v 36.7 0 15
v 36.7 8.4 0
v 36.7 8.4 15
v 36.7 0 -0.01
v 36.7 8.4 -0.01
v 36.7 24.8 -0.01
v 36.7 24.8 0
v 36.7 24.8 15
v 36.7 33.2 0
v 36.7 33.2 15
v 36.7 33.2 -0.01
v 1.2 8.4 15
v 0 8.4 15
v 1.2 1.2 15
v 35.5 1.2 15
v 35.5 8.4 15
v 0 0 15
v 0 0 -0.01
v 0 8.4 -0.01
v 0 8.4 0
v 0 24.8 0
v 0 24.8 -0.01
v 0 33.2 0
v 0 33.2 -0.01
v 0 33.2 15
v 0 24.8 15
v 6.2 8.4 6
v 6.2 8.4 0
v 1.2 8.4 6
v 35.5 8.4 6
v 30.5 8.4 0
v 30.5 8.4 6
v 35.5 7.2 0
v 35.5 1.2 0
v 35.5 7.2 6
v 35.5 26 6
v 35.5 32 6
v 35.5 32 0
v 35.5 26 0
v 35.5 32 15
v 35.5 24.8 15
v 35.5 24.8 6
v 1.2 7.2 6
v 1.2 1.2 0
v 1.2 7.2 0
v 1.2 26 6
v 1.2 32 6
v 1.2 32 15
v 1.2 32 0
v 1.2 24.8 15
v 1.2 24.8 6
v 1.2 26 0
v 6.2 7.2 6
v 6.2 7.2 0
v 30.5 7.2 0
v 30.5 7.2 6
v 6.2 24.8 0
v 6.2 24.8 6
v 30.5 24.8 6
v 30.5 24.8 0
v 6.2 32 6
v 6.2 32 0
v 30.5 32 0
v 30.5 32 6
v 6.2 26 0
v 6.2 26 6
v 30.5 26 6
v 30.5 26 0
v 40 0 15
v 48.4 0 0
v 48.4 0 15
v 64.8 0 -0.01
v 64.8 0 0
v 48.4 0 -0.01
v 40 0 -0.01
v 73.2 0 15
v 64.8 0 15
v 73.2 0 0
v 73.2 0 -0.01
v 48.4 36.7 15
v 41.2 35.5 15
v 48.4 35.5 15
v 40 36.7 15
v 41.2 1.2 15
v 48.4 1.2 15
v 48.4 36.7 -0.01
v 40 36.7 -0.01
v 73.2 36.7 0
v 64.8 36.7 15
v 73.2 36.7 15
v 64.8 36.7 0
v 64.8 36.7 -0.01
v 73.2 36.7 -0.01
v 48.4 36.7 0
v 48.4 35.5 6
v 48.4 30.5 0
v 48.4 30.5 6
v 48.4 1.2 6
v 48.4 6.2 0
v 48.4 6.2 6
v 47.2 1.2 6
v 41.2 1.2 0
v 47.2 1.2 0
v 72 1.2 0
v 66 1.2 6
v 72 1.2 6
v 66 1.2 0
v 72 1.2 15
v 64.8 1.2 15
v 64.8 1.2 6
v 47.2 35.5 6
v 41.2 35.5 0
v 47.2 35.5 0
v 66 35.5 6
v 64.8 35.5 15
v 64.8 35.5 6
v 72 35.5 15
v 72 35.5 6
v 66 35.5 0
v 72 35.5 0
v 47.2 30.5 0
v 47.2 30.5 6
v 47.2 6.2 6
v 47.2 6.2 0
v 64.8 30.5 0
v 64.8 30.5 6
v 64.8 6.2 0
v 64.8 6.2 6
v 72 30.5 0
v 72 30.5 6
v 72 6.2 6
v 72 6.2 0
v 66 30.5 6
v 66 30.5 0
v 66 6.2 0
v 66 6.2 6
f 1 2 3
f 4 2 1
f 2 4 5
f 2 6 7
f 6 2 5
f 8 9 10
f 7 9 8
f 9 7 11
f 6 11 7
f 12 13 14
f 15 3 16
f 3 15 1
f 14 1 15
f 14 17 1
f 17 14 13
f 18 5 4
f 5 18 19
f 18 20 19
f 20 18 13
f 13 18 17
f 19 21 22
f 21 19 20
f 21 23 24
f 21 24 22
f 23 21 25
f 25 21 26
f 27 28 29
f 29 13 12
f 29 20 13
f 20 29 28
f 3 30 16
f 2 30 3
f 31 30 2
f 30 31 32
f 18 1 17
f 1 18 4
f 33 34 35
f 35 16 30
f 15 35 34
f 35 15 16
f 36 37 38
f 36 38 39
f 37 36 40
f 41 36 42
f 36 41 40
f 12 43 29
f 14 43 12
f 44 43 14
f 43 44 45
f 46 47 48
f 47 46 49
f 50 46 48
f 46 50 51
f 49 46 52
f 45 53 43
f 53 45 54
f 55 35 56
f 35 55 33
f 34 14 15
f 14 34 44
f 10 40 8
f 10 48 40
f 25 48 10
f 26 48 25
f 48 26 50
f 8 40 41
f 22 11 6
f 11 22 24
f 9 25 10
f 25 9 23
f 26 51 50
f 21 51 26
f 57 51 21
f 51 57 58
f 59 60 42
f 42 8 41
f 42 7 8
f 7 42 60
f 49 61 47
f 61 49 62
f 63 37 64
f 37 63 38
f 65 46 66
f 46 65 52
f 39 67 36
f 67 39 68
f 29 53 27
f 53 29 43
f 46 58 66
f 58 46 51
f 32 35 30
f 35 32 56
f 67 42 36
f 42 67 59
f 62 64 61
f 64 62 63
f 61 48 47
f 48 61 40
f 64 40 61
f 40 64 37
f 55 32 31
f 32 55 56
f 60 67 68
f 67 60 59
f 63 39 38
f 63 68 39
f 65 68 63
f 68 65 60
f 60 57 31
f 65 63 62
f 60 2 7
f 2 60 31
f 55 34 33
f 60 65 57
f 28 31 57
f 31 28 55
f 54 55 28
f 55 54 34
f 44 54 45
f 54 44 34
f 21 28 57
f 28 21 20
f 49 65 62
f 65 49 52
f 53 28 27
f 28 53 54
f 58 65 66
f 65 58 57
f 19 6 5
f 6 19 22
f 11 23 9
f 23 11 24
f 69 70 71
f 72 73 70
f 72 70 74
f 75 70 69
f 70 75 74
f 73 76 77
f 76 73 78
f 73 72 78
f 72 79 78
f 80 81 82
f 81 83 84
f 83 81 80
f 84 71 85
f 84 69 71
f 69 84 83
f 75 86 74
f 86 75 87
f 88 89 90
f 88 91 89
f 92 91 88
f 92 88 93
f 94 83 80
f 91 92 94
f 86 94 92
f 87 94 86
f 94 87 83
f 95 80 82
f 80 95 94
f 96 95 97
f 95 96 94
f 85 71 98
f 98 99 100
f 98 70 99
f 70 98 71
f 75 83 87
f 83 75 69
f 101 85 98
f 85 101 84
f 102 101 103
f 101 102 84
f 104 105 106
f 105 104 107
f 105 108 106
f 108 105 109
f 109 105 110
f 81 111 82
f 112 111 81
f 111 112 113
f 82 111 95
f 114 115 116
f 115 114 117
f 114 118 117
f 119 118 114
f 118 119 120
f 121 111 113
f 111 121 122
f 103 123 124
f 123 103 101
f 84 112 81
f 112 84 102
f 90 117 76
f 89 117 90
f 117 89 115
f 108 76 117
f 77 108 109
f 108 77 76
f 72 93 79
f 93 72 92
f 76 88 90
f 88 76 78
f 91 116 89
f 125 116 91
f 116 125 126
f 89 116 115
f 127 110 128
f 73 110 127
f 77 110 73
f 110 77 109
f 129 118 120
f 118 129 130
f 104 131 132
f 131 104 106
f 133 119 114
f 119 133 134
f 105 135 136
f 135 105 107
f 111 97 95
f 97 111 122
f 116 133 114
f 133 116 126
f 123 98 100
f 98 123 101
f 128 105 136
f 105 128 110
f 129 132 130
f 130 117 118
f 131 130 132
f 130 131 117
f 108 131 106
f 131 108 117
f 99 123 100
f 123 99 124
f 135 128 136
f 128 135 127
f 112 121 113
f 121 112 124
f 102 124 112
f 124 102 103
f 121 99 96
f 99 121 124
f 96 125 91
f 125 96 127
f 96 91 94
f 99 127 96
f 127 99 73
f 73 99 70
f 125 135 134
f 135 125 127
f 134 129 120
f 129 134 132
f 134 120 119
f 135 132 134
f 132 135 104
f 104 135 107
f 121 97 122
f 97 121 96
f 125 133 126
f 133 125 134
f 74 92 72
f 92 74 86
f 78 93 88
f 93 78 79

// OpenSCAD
// file: ../../Base/Boxes.scad
// Fischertechnik Box Foundation
// Pre-designed Boxes

use <Constants.scad>

include <PlacementOptions.scad>

box190Width = 190;
box190Depth = 130;
box130Width = 130;
box130Depth = 95;
boxUsageHeight = 33.9;
boxWallThickness = 2.4;
boxBaseThickness = 1.0;

// getBoxWallThickness()
// Gets the wall thickness of a Fischertechnik Box

function getBoxWallThickness() = boxWallThickness;

// Gets the usable height of a fischertechnik box
function getBoxUsageHeight() = boxUsageHeight;

// Gets the thickness of the Fischertechnik box base.
function getBoxBaseThickness() = boxBaseThickness;

// Gets the usable inner space of a Box 190 as an x/y-list
function getBox190Space() = [
    box190Width - 2*getBoxWallThickness(), 
    box190Depth - 2*getBoxWallThickness() ];

// Imports the Fischertechnik empty box 130x190 mm and places it at position 0,0
// 190x130 are the outer sizes, the inner space is slightly smaller. Use getBox190Space() to get the inner sizes.
// This module needs the STL file "Fischertechnik Box 130x190.stl" in the library path.
// The box is positioned that the usable inner space is at the 0,0,0 position. The

module Box190() {
    translate([-getBoxWallThickness(),-getBoxWallThickness(),-getBoxBaseThickness()])
        import("Fischertechnik Box 130x190.stl", convexity=3);
}

// Gets the usable inner space of a Box 130 as an x/y-list
function getBox130Space() = [
    box130Width - 2*getBoxWallThickness(), 
    box130Depth - 2*getBoxWallThickness() ];

// Imports the Fischertechnik empty box 95x130 mm and places it at position 0,0
// 190x130 are the outer sizes, the inner space is slightly smaller. Use getBox190Space() to get the inner sizes.
// This module needs the STL file "Fischertechnik Box 95x130.stl" in the library path.
// The box is positioned that the usable inner space is at the 0,0,0 position. The

module Box130() {
    translate([-getBoxWallThickness(),-getBoxWallThickness(),-getBoxBaseThickness()])
        import("Fischertechnik Box 95x130.stl", convexity=3);
}

// Creates a web at the specified box walls
// corner 0 = LowerLeft, 1 = UpperLeft, 2 = UpperRight, 3 = LowerRight
// side 0 = LeftOfCorner, 1 = RightOfCorner
// distance = Distance in mm from the corner
// box = inner width and depth of the box (default: Box 190)
// webWidth = length of the web (default is 3 mms)
// webThickness = thickness of the web (default is 1 mm)

module BoxWeb(corner, side, distance, box=getBox190Space(), webWidth=3, webThickness=1.0) {
    sink = getBoxWallThickness()/2;

    width = (corner % 2 == 0) ? 
            (side == LeftOfCorner ? webWidth : webThickness) :
            (side == LeftOfCorner ? webThickness : webWidth);

    depth = (corner % 2 == 0) ? 
            (side == RightOfCorner ? webWidth : webThickness) :
            (side == RightOfCorner ? webThickness : webWidth);
    
    xDiff = corner == LowerLeft ? 
                (side == LeftOfCorner ? -sink : distance) :
            (corner == UpperLeft ?                
                (side == LeftOfCorner ? distance : -sink) :
            (corner == UpperRight ?
                (side == LeftOfCorner ? box.x-webWidth+sink : box.x-distance-webThickness) :
                (side == LeftOfCorner ? box.x-distance-webThickness: box.x-webWidth+sink)));

    yDiff = corner == LowerLeft ? 
                (side == RightOfCorner ? -sink : distance) :
            (corner == UpperLeft ?
                (side == RightOfCorner ? box.y-distance : box.y-webWidth+sink) :
            (corner == UpperRight ?
                (side == RightOfCorner ? box.y-webWidth+sink : box.y-distance) :
                (side == RightOfCorner ? distance : -sink)));
    
    translate([xDiff, yDiff, -getExcess()])
        cube([width, depth, boxUsageHeight + 2*getExcess()]);
}
// file: ../../Base/Rotation.scad
// Fischertechnik Box Foundation
// Geometry Helpers Rotation

include <PlacementOptions.scad>

// getRotatedSpace(space, rotation=NoRotation)
// Rotates the space dependent on the specified rotation

function getRotatedSpace(space, rotation=NoRotation) = [
    (rotation == Rotate90 || rotation == Rotate270) ? space.y : space.x,
    (rotation == Rotate90 || rotation == Rotate270) ? space.x : space.y
];

// Rotates the given space around the fixed left lower corner
// space = the space the children needs as width/depth list [width,depth]
// rotation = 0 Rotate0 degrees, 1 Rotate90 degrees, 2 Rotate180 degrees, 3 Rotate270 degrees (equivalent to -90)

module RotateFix(space, rotation=Rotate0) {
    dy = (rotation == Rotate0 || rotation == Rotate270) ? 0 :
        (rotation == Rotate90) ? space.x :
        space.y;
    dx = (rotation < Rotate180) ? 0 :
        (rotation == Rotate180) ? space.x :
        space.y;
    
    translate([dx, dy, 0])
        rotate([0, 0, rotations[rotation]])
            children();
}
// file: ../../Base/Alignment.scad
// Fischertechnik Box Foundation
// Geometry Helpers Alignment

include <PlacementOptions.scad>

// getAlignedX(elementWidth, spaceWidth, align=AlignRight, offset=0)
// Gets the aligned X offset of an element with the given
// width in the given space.
// elementWidth = The width of the element to positon
// spaceWidth = The space where the element should be aligned
// align = 0 AlignLeft, 1 AlignCenter, 2 AlignRight
// offset = an optional offset from the aligned position. When
// aligned left or centered, then positive values are in X direction.
// When aligned right then positive values are in negative X direction.

function getAlignedX(elementWidth, spaceWidth, align=AlignRight, offset=0) =
    (align == AlignLeft) ?
        offset :
        ((align == AlignCenter) ?
        (spaceWidth - elementWidth)/2 + offset :
        spaceWidth - offset - elementWidth);

// getAlignedY(elementDepth, spaceDepth, align=AlignTop, offset=0)
// Gets the aligned Y offset of an element with the given
// depth in the given space.
// elementDepth = The depth of the element to positon
// spaceDepth = The space where the element should be aligned
// align = 0 AlignBottom, 1 AlignCenter, 2 AlignTop
// offset = an optional offset from the aligned position. When
// aligned bottom or centered, then positive values are in Y direction.
// When aligned top then positive values are in negative Y direction.

function getAlignedY(elementDepth, spaceDepth, align=AlignTop, offset=0) =
    (align == AlignBottom) ?
        offset :
        ((align == AlignCenter) ?
        (spaceDepth - elementDepth)/2 + offset :
        spaceDepth - offset - elementDepth);
// file: ../../Base/Constants.scad
// Fischertechnik Box Foundation
// Constants

// Constant values necessary for multiple elements

// Base constants
dividerThickness = 1.2;
excess = 0.01;
fragments = 90;
tolerance = 0.8;

// Gets the thickness of a divider 
function getDividerThickness() = dividerThickness;

// Gets the excess that is used to merge walls into each other
function getExcess() = excess;

// Gets amount of fragments of a cylinder
function getFragments() = fragments;

// Gets the inner tolerance of a frame to each side
function getTolerance() = tolerance;


// Fischertechnik specific constants
axisDiameter = 4;
axisBottomDiameter = axisDiameter + 1;
standardEdgeDistance = 2.5;
standardWebDistance = 11.5;
standardCornerLength = 15;
tubeWallFactor = 1.6;

// Gets axis diameter
function getAxisDiameter() = axisDiameter;

// Gets axis bottom diameter for thicker part at the bottom
function getAxisBottomDiameter() = axisBottomDiameter;

// gets the standard distance to the wall of the box for dockable frames with webs
function getStandardEdgeDistance() = standardEdgeDistance;

// gets the standard distance of each web to the corner of the dockable frame
function getStandardWebDistance() = standardWebDistance;

// gets the standard length of the corner walls of a dockable frame
function getStandardCornerLength() = standardCornerLength;

// gets the wall thickness of a tube.
function getTubeWallThickness() = tubeWallFactor * getDividerThickness();
// file: ../../Base/PlacementOptions.scad
// Fischertechnik Box Foundation
// Placement Options

// Alignment
NoAlign = 0;
AlignLeft = 1;
AlignBottom = 2;
AlignCenter = 3;
AlignRight = 4;
AlignTop = 5;

// Element rotation degree steps
rotations = [0, -90, -180, -270];

// Rotation
NoRotation = 0;
Rotate0 = 0;
Rotate90 = 1;
Rotate180 = 2;
Rotate270 = 3;

// Docking (seen from above)
NoDock = -1;
DockLeft = 0;
DockTop = 1;
DockRight = 2;
DockCorner = 2;
DockBottom = 3;

// Web corners
LowerLeft = 0;
UpperLeft = 1;
UpperRight = 2;
LowerRight = 3;

// Web position relative to corner
LeftOfCorner = 0;
RightOfCorner = 1;
// file: ../../Elements/FrameLens.scad
// Fischertechnik Box Library
// Frame for Lenses
// 31365, 31366, 31367 

use <../ModelBase/Simple.scad>
use <../ModelBase/Complex.scad>

width = 33.5;
depth = 30;
height = 6.0;

// getFrameLensSpace()
// Gets the outer space the lens frame needs.

function getFrameLensSpace() = getFrameOuterVolume([width, depth, height]);

// FrameLens()
// Frame for 30 mm flat lenses.

module FrameLens() {
    FrameSpecialFlat([width, depth, height]);
}

// Tests
color("lightgray") {
    FrameLens();
}
// file: ../../Base/Placement.scad
// Fischertechnik Box Foundation
// Geometry Helpers Placement

use <Constants.scad>
use <Alignment.scad>
use <Rotation.scad>
use <Boxes.scad>

include <PlacementOptions.scad>

// Place(x=0, y=0, elementSpace=[0,0], alignX=AlignLeft, alignY=AlignBottom, rotation=Rotate0, boxSpace=getBox190Space())
// Places the child at the specified position
// y = Y-Position. This is a relative position when an X aligment is specified.
// x = X-Position. This is a relative position when an Y aligment is specified.
// elementSpace = space of the element to be placed [x,y]
// alignX = -1=NoAlign, 0 AlignLeft, 1 AlignCenter, 3 AlignRight (elementSpace and boxSpace required!)
// alignY = -1=NoAlign, 2 AlignBottom, 1 AlignCenter, 4 AlignTop (elementSpace and boxSpace required!)
// rotation = 0 Rotate0 0 degrees, 1 Rotate90 90 degrees, 
// 2 Rotate180 180 degrees, 3 Rotate270 270 degrees (equivalent to -90)
// boxSpace = Inner space of the box where the placement occurs [x,y] - default is Box 190x130 inner space

module Place(x=0, y=0, elementSpace=[0,0], 
  alignX=AlignLeft, alignY=AlignBottom, 
  rotation=NoRotation, boxSpace=getBox190Space()) {

    module Position(x, y, space, rotation=Rotate0) {
        translate([x, y, 0])
            RotateFix(space, rotation)
                children(0);
    }

    space = getRotatedSpace(elementSpace, rotation);
    alignedX = getAlignedX(space.x, boxSpace.x, alignX, x);
    alignedY = getAlignedY(space.y, boxSpace.y, alignY, y);
    Position(alignedX, alignedY, elementSpace, rotation)
        children(0);
}

// Center(space=getBox130Space(), elementSpace=[0,0])
// space = Space where the children is centered. For cylinder use centered=true and no elementSpace.
// elementSpace = space of the element to be centered [x,y]

module Center(space=getBox190Space(), elementSpace=[0,0]) {
    translate([(space.x - elementSpace.x) / 2, (space.y - elementSpace.y) / 2])
        children(0);
}

// CenterHorizontal(width=0, y=0, offset=0, space=getBox130Space())
// space = Space where the children is centered. For cylinder use centered=true and no elementSpace.
// elementSpace = space of the element to be centered [x,y]

module CenterHorizontal(width=0, y=0, offset=0, space=getBox190Space()) {
    translate([(space.x - width) / 2 + offset, y])
        children(0);
}

// CenterVertical(depth=0, x=0, offset=0, space=getBox130Space())
// space = Space where the children is centered. For cylinder use centered=true and no elementSpace.
// elementSpace = space of the element to be centered [x,y]

module CenterVerticalal(depth=0, x=0, offset=0, space=getBox190Space()) {
    translate([x, (space.y - depth) / 2 + offset])
        children(0);
}
// main file
// Fischertechnik Box Foundation
// Elements
// Test FrameLens

use <../../Base/Placement.scad>
use <../../Elements/FrameLens.scad>

include <../../Base/PlacementOptions.scad>

FrameLens();

Place(40, 0, getFrameLensSpace(), rotation=Rotate90)
    FrameLens();
